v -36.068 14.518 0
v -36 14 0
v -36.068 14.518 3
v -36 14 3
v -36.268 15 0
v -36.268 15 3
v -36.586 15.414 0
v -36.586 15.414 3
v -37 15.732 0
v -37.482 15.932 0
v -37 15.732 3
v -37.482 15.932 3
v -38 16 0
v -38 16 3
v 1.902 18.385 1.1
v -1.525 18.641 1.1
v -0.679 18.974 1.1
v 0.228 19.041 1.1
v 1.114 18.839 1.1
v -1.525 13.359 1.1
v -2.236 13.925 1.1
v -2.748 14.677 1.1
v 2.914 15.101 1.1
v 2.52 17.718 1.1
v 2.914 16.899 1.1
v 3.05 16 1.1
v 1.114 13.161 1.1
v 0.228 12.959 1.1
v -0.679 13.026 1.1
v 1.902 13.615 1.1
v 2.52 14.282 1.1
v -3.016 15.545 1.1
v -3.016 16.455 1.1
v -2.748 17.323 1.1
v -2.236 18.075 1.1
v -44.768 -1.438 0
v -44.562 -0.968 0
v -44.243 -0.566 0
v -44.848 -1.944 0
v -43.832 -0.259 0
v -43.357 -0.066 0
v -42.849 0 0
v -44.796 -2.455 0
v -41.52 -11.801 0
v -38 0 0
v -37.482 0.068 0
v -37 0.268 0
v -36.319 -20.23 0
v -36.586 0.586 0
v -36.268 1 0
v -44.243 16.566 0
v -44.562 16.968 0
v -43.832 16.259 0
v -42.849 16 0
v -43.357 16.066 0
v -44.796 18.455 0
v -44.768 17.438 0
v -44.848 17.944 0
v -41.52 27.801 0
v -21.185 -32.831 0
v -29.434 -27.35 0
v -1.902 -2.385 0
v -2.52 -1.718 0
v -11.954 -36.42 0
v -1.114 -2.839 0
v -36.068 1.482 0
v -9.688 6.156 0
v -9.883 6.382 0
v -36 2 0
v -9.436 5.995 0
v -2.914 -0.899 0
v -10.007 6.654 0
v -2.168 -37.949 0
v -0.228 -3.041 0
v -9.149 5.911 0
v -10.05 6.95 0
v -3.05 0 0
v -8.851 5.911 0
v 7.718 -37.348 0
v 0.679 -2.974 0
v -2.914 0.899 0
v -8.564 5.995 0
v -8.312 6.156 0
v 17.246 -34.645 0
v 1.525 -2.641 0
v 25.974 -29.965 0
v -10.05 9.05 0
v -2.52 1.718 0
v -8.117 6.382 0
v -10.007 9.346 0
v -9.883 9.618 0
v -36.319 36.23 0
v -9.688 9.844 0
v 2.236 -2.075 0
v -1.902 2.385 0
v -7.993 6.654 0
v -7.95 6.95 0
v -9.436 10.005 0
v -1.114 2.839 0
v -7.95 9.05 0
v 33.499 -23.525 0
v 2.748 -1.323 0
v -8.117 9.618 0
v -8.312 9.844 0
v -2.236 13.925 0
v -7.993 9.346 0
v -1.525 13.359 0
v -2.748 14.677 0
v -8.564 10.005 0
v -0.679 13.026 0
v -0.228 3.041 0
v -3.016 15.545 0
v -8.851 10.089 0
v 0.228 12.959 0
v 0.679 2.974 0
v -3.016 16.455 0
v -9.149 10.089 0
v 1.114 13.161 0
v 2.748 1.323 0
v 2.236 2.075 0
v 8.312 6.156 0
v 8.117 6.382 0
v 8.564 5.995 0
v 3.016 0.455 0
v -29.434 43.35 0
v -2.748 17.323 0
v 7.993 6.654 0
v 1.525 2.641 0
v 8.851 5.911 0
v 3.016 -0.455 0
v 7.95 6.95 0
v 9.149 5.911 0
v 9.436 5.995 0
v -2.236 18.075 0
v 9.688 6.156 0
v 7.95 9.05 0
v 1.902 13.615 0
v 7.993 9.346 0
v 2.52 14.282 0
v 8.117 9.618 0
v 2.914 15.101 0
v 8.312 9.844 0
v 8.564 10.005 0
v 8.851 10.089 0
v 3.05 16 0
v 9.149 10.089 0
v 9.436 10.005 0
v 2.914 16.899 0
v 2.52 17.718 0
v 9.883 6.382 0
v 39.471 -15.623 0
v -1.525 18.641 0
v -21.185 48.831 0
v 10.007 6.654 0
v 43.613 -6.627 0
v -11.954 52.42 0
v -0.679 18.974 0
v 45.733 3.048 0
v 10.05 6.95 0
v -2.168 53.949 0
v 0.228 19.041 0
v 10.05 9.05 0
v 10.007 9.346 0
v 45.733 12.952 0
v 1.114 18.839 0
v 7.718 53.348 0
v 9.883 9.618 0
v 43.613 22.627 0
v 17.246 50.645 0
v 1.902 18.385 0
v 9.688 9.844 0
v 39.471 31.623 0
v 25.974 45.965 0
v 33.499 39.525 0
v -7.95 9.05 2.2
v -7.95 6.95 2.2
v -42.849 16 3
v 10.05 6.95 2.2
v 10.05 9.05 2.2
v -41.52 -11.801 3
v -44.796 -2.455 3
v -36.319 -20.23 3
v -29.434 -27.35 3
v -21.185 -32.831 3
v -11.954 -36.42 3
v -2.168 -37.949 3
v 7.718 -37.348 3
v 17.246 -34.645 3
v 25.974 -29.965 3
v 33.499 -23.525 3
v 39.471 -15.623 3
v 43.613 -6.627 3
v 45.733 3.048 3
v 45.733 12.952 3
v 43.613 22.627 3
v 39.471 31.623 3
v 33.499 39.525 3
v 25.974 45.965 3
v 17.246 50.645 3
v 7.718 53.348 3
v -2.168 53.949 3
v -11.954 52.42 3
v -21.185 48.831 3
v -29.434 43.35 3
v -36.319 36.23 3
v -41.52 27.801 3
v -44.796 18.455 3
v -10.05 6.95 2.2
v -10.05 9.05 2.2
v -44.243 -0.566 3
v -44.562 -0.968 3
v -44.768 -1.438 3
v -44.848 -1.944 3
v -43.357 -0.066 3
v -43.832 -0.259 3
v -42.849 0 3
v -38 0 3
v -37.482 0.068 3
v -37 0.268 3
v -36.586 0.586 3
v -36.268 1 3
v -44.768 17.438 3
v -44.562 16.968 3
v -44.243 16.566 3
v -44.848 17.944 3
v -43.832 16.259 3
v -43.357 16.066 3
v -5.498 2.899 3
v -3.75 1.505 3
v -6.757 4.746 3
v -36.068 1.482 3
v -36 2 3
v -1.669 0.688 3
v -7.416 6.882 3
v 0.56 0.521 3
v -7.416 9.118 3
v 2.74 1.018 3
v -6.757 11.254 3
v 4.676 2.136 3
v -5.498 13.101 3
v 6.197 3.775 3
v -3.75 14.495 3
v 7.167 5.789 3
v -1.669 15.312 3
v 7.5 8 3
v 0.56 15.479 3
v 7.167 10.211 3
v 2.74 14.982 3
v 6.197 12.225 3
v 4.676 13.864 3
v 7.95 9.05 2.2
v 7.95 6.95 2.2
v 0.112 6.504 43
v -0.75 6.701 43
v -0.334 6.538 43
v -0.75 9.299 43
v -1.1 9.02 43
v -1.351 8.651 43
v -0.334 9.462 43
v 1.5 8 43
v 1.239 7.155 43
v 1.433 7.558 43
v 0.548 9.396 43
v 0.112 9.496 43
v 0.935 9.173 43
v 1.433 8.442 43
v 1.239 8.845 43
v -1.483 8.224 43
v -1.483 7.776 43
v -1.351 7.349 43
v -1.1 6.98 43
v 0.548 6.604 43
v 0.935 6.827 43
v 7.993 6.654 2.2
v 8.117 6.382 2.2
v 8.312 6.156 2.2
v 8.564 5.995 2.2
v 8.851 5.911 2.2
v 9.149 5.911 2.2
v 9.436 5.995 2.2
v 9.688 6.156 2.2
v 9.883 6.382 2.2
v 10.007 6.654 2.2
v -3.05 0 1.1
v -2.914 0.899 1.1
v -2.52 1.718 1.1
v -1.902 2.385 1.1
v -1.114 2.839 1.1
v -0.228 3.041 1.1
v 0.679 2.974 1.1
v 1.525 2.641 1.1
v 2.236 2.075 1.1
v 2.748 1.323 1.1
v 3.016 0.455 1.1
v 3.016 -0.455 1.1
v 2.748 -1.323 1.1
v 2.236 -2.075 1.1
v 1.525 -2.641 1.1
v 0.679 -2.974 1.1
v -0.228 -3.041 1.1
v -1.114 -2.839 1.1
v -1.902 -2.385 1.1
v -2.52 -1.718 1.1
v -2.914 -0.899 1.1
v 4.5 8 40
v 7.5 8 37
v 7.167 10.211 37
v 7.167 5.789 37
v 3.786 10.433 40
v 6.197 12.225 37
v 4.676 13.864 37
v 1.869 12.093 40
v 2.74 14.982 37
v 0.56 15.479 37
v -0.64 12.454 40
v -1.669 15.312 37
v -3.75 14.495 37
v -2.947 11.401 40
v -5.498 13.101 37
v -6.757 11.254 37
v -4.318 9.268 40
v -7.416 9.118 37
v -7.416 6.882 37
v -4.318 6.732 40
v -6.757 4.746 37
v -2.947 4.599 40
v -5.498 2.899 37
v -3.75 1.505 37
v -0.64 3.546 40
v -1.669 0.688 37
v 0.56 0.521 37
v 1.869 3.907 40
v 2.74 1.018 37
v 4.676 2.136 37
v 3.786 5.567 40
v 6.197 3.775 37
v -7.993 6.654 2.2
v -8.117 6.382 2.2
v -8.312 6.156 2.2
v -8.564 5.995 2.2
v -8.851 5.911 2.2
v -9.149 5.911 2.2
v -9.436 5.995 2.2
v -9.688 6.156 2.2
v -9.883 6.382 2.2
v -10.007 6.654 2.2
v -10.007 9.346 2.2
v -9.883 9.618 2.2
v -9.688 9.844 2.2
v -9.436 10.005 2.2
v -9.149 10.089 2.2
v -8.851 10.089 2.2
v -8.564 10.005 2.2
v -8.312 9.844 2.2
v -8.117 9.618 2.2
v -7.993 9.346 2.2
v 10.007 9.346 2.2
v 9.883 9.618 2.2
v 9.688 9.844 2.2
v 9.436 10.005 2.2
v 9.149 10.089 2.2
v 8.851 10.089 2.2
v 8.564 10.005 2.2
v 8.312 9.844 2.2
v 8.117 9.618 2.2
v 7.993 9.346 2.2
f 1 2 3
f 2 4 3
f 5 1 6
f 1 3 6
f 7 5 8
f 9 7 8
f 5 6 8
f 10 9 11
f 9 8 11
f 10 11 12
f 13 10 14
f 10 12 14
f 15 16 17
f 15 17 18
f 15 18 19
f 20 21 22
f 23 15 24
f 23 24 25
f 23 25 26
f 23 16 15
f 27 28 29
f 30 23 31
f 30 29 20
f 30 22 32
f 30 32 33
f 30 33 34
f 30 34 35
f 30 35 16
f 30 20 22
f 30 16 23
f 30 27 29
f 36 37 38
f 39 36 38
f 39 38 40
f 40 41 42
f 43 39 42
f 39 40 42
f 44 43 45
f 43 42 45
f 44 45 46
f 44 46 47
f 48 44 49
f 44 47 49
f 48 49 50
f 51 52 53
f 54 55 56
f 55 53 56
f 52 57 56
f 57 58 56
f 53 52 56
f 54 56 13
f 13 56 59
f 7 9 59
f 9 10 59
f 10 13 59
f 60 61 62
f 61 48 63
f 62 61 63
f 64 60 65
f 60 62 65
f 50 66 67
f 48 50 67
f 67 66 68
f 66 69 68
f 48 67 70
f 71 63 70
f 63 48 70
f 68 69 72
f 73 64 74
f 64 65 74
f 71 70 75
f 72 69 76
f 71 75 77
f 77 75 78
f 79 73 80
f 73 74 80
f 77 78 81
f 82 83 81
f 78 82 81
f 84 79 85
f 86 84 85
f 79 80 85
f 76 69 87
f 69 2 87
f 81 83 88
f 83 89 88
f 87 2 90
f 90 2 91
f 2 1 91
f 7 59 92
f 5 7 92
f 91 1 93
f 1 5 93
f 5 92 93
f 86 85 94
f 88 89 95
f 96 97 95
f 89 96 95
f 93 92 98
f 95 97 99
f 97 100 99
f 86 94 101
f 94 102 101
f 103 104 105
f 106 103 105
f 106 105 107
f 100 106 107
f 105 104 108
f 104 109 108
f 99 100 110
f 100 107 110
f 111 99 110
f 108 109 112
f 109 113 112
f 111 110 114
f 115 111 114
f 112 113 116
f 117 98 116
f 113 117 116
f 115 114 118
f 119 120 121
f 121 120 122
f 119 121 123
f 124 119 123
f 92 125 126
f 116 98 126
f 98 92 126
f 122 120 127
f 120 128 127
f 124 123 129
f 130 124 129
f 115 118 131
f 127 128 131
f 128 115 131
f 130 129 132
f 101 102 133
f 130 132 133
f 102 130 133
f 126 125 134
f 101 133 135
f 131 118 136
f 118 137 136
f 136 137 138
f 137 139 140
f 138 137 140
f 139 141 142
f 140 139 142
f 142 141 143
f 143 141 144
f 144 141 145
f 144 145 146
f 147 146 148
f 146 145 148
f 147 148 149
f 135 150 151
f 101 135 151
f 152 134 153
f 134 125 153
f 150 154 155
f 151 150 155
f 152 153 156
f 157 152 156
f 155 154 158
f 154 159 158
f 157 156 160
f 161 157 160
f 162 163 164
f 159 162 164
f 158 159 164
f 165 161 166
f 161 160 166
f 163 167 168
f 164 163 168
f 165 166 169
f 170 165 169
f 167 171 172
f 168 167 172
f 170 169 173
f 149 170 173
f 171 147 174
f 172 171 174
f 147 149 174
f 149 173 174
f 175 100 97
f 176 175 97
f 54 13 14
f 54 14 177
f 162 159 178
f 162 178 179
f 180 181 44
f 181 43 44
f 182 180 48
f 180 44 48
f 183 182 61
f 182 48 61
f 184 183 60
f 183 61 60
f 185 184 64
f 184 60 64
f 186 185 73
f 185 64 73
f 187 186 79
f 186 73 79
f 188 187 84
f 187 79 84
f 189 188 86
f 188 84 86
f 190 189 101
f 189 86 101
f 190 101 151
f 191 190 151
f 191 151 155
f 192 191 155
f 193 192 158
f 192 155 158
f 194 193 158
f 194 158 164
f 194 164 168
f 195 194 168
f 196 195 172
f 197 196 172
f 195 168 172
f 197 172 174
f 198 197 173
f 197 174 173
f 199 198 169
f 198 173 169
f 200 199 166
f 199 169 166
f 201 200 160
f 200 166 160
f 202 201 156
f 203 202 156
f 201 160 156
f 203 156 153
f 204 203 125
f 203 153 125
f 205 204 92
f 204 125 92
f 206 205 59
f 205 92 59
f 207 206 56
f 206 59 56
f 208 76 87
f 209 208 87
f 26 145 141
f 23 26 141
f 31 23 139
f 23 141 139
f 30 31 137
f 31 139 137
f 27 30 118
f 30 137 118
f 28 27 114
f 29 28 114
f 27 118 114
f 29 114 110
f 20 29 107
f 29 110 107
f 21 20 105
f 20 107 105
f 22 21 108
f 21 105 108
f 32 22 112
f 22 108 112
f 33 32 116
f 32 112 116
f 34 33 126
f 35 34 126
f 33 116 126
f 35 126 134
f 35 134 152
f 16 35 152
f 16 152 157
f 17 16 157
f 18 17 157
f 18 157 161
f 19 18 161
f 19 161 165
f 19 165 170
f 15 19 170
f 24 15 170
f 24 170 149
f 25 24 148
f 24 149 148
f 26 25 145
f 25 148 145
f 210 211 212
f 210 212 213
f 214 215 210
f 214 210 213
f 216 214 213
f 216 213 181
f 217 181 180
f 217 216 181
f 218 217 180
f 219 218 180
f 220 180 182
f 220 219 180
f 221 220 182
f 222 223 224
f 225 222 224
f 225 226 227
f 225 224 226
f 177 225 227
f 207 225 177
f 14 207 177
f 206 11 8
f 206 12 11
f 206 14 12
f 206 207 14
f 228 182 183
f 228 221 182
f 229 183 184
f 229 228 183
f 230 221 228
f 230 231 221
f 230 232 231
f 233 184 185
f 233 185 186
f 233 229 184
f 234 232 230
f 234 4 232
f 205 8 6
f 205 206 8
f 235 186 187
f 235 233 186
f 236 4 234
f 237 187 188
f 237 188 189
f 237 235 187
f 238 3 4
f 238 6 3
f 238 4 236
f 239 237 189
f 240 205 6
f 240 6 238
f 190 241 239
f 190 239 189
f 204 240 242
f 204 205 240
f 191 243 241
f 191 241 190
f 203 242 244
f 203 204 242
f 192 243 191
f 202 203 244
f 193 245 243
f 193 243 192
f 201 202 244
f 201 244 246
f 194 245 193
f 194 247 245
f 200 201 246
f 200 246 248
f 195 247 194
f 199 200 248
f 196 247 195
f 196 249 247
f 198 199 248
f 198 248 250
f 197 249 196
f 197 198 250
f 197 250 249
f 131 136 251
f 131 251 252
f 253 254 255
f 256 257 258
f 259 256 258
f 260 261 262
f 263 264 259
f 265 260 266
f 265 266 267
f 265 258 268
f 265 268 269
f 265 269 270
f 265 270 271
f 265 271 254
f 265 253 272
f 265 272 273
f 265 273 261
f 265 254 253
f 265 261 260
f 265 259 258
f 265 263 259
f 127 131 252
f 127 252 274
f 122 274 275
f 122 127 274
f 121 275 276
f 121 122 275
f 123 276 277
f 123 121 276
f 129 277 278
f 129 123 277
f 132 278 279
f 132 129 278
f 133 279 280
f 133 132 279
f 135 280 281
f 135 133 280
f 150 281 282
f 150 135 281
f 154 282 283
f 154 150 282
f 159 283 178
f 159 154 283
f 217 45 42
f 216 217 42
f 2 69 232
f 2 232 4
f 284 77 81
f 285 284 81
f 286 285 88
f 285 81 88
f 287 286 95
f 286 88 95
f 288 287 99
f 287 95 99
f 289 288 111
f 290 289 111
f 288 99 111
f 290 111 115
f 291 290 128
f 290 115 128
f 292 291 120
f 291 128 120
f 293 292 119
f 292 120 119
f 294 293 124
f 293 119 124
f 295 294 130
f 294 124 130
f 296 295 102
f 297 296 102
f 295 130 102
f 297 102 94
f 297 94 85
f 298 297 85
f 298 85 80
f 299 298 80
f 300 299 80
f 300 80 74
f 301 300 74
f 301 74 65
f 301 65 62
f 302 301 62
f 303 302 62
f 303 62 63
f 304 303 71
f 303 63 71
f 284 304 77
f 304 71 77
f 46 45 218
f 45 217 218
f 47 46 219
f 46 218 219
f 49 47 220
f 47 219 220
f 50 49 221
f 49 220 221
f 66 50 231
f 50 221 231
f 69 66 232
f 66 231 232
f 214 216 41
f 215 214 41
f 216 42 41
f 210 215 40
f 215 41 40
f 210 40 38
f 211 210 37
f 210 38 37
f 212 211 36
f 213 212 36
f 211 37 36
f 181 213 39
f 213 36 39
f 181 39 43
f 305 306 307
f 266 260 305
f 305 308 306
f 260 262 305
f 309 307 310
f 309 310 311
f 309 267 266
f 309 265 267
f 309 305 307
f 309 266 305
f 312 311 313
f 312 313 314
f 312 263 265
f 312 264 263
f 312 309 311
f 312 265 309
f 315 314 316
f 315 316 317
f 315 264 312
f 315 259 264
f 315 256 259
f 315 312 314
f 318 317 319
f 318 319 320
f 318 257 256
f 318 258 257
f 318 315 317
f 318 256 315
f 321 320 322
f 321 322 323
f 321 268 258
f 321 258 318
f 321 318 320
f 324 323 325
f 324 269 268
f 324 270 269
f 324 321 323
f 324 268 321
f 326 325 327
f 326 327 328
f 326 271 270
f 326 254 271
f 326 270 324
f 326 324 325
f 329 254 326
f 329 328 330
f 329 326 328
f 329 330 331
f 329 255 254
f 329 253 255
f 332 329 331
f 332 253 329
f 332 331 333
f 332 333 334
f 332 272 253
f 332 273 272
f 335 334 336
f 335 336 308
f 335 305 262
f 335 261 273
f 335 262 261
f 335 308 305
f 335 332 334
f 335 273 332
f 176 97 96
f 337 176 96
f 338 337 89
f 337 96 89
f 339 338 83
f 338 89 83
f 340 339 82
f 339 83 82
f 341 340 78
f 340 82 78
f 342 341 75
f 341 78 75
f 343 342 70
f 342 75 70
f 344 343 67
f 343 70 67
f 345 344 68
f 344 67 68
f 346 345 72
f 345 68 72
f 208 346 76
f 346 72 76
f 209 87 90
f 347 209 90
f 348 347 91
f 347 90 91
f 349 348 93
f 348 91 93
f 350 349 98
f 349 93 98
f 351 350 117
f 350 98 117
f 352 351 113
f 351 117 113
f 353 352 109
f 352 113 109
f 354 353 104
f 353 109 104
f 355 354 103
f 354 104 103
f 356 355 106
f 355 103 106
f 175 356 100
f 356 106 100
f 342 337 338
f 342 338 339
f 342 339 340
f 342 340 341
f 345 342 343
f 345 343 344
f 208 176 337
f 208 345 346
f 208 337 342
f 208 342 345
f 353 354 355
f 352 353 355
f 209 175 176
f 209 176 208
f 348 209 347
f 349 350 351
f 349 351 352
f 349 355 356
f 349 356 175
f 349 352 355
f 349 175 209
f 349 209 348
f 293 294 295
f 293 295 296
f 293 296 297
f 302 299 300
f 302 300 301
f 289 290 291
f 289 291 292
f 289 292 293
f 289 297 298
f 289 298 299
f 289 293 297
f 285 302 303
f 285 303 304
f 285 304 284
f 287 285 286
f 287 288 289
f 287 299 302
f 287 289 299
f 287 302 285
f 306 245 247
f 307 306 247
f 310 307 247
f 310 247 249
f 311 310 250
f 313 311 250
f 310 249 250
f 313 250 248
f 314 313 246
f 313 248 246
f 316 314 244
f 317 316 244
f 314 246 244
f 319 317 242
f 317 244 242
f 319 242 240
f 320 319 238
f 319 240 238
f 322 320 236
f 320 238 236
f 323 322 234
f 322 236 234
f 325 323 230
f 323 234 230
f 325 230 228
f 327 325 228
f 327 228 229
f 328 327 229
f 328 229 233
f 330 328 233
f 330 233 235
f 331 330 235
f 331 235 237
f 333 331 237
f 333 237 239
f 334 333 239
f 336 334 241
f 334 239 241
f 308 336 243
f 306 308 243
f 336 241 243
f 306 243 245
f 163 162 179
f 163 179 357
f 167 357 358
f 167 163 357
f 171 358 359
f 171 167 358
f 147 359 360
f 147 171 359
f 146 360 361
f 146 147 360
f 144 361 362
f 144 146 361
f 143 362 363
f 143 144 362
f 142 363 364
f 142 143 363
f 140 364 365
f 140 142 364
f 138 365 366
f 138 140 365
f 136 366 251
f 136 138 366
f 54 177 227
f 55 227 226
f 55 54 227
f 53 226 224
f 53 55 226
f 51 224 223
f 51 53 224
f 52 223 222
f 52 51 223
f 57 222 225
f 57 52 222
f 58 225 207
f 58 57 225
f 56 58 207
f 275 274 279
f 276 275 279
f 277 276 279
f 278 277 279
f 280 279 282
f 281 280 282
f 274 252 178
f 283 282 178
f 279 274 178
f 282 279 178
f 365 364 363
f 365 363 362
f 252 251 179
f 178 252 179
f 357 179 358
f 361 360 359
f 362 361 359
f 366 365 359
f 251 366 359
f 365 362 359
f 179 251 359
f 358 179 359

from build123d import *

# Parameters (mm, degrees)
SKETCH1_R           = 46
BOSS_EXTRUDE1_DEPTH = 3
SKETCH3_R           = 3.05
CUT_EXTRUDE2_DEPTH  = 1.1
CUT_EXTRUDE1_DEPTH  = 2.2
SKETCH4_R           = 7.5
BOSS_EXTRUDE2_DEPTH = 40
CHAMFER1_SIZE       = 6
SIZE_MEDICINE_REACH = 84.952
SKETCH5_W           = 10
SKETCH5_H           = 16
FILLET1_R           = 2


with BuildPart() as part:
    # Sketch1 → Boss-Extrude1 (new body)
    with BuildSketch(Plane.XY):
        with Locations((0, 8)):
            Circle(SKETCH1_R)
    extrude(amount=BOSS_EXTRUDE1_DEPTH)

    # Sketch3 → Cut-Extrude2 (cut)
    with BuildSketch(Plane(origin=(0, 0, 0), x_dir=(-1, 0, 0), z_dir=(0, 0, -1))):
        Circle(SKETCH3_R)
        with Locations(Location((0, 16, 0), (0, 0, 180))):
            Circle(SKETCH3_R)
    extrude(amount=-CUT_EXTRUDE2_DEPTH, mode=Mode.SUBTRACT)

    # Sketch2 → Cut-Extrude1 (cut)
    with BuildSketch(Plane(origin=(0, 0, 0), x_dir=(-1, 0, 0), z_dir=(0, 0, -1))):
        with BuildLine():
            Line((-7.95, 9.05), (-7.95, 6.95))
            ThreePointArc((-7.95, 6.95), (-9, 5.9), (-10.05, 6.95))
            Line((-10.05, 6.95), (-10.05, 9.05))
            ThreePointArc((-10.05, 9.05), (-9, 10.1), (-7.95, 9.05))
        make_face()
        with BuildLine():
            Line((7.95, 9.05), (7.95, 6.95))
            ThreePointArc((7.95, 6.95), (9, 5.9), (10.05, 6.95))
            Line((10.05, 6.95), (10.05, 9.05))
            ThreePointArc((10.05, 9.05), (9, 10.1), (7.95, 9.05))
        make_face()
    extrude(amount=-CUT_EXTRUDE1_DEPTH, mode=Mode.SUBTRACT)

    # Sketch4 → Boss-Extrude2 (add)
    with BuildSketch(Plane.XY.offset(3)):
        with Locations((0, 8)):
            Circle(SKETCH4_R)
    extrude(amount=BOSS_EXTRUDE2_DEPTH)

    # Chamfer1
    chamfer1_edges = [part.edges().sort_by_distance(p)[0] for p in [
        (-7.5, 8, 43),
    ]]
    chamfer(chamfer1_edges, length=CHAMFER1_SIZE)

    # Sketch5 → Size-Medicine (cut, up to next)
    with BuildSketch(Plane(origin=(0, 0, 0), x_dir=(-1, 0, 0), z_dir=(0, 0, -1)), mode=Mode.PRIVATE) as size_medicine_sk1:
        with Locations((41, 8)):
            Rectangle(SKETCH5_W, SKETCH5_H)
    size_medicine_tool1 = extrude(size_medicine_sk1.sketch, amount=-SIZE_MEDICINE_REACH, mode=Mode.PRIVATE) & part.part
    add(size_medicine_tool1.solids().sort_by_distance((-41, 8, 0))[0], mode=Mode.SUBTRACT)

    # Fillet1
    fillet1_edges = [part.edges().sort_by_distance(p)[0] for p in [
        (-45.299006612, 0, 1.5),
        (-45.299006612, 16, 1.5),
        (-36, 16, 1.5),
        (-36, 0, 1.5),
    ]]
    fillet(fillet1_edges, radius=FILLET1_R)


solid = part.part
